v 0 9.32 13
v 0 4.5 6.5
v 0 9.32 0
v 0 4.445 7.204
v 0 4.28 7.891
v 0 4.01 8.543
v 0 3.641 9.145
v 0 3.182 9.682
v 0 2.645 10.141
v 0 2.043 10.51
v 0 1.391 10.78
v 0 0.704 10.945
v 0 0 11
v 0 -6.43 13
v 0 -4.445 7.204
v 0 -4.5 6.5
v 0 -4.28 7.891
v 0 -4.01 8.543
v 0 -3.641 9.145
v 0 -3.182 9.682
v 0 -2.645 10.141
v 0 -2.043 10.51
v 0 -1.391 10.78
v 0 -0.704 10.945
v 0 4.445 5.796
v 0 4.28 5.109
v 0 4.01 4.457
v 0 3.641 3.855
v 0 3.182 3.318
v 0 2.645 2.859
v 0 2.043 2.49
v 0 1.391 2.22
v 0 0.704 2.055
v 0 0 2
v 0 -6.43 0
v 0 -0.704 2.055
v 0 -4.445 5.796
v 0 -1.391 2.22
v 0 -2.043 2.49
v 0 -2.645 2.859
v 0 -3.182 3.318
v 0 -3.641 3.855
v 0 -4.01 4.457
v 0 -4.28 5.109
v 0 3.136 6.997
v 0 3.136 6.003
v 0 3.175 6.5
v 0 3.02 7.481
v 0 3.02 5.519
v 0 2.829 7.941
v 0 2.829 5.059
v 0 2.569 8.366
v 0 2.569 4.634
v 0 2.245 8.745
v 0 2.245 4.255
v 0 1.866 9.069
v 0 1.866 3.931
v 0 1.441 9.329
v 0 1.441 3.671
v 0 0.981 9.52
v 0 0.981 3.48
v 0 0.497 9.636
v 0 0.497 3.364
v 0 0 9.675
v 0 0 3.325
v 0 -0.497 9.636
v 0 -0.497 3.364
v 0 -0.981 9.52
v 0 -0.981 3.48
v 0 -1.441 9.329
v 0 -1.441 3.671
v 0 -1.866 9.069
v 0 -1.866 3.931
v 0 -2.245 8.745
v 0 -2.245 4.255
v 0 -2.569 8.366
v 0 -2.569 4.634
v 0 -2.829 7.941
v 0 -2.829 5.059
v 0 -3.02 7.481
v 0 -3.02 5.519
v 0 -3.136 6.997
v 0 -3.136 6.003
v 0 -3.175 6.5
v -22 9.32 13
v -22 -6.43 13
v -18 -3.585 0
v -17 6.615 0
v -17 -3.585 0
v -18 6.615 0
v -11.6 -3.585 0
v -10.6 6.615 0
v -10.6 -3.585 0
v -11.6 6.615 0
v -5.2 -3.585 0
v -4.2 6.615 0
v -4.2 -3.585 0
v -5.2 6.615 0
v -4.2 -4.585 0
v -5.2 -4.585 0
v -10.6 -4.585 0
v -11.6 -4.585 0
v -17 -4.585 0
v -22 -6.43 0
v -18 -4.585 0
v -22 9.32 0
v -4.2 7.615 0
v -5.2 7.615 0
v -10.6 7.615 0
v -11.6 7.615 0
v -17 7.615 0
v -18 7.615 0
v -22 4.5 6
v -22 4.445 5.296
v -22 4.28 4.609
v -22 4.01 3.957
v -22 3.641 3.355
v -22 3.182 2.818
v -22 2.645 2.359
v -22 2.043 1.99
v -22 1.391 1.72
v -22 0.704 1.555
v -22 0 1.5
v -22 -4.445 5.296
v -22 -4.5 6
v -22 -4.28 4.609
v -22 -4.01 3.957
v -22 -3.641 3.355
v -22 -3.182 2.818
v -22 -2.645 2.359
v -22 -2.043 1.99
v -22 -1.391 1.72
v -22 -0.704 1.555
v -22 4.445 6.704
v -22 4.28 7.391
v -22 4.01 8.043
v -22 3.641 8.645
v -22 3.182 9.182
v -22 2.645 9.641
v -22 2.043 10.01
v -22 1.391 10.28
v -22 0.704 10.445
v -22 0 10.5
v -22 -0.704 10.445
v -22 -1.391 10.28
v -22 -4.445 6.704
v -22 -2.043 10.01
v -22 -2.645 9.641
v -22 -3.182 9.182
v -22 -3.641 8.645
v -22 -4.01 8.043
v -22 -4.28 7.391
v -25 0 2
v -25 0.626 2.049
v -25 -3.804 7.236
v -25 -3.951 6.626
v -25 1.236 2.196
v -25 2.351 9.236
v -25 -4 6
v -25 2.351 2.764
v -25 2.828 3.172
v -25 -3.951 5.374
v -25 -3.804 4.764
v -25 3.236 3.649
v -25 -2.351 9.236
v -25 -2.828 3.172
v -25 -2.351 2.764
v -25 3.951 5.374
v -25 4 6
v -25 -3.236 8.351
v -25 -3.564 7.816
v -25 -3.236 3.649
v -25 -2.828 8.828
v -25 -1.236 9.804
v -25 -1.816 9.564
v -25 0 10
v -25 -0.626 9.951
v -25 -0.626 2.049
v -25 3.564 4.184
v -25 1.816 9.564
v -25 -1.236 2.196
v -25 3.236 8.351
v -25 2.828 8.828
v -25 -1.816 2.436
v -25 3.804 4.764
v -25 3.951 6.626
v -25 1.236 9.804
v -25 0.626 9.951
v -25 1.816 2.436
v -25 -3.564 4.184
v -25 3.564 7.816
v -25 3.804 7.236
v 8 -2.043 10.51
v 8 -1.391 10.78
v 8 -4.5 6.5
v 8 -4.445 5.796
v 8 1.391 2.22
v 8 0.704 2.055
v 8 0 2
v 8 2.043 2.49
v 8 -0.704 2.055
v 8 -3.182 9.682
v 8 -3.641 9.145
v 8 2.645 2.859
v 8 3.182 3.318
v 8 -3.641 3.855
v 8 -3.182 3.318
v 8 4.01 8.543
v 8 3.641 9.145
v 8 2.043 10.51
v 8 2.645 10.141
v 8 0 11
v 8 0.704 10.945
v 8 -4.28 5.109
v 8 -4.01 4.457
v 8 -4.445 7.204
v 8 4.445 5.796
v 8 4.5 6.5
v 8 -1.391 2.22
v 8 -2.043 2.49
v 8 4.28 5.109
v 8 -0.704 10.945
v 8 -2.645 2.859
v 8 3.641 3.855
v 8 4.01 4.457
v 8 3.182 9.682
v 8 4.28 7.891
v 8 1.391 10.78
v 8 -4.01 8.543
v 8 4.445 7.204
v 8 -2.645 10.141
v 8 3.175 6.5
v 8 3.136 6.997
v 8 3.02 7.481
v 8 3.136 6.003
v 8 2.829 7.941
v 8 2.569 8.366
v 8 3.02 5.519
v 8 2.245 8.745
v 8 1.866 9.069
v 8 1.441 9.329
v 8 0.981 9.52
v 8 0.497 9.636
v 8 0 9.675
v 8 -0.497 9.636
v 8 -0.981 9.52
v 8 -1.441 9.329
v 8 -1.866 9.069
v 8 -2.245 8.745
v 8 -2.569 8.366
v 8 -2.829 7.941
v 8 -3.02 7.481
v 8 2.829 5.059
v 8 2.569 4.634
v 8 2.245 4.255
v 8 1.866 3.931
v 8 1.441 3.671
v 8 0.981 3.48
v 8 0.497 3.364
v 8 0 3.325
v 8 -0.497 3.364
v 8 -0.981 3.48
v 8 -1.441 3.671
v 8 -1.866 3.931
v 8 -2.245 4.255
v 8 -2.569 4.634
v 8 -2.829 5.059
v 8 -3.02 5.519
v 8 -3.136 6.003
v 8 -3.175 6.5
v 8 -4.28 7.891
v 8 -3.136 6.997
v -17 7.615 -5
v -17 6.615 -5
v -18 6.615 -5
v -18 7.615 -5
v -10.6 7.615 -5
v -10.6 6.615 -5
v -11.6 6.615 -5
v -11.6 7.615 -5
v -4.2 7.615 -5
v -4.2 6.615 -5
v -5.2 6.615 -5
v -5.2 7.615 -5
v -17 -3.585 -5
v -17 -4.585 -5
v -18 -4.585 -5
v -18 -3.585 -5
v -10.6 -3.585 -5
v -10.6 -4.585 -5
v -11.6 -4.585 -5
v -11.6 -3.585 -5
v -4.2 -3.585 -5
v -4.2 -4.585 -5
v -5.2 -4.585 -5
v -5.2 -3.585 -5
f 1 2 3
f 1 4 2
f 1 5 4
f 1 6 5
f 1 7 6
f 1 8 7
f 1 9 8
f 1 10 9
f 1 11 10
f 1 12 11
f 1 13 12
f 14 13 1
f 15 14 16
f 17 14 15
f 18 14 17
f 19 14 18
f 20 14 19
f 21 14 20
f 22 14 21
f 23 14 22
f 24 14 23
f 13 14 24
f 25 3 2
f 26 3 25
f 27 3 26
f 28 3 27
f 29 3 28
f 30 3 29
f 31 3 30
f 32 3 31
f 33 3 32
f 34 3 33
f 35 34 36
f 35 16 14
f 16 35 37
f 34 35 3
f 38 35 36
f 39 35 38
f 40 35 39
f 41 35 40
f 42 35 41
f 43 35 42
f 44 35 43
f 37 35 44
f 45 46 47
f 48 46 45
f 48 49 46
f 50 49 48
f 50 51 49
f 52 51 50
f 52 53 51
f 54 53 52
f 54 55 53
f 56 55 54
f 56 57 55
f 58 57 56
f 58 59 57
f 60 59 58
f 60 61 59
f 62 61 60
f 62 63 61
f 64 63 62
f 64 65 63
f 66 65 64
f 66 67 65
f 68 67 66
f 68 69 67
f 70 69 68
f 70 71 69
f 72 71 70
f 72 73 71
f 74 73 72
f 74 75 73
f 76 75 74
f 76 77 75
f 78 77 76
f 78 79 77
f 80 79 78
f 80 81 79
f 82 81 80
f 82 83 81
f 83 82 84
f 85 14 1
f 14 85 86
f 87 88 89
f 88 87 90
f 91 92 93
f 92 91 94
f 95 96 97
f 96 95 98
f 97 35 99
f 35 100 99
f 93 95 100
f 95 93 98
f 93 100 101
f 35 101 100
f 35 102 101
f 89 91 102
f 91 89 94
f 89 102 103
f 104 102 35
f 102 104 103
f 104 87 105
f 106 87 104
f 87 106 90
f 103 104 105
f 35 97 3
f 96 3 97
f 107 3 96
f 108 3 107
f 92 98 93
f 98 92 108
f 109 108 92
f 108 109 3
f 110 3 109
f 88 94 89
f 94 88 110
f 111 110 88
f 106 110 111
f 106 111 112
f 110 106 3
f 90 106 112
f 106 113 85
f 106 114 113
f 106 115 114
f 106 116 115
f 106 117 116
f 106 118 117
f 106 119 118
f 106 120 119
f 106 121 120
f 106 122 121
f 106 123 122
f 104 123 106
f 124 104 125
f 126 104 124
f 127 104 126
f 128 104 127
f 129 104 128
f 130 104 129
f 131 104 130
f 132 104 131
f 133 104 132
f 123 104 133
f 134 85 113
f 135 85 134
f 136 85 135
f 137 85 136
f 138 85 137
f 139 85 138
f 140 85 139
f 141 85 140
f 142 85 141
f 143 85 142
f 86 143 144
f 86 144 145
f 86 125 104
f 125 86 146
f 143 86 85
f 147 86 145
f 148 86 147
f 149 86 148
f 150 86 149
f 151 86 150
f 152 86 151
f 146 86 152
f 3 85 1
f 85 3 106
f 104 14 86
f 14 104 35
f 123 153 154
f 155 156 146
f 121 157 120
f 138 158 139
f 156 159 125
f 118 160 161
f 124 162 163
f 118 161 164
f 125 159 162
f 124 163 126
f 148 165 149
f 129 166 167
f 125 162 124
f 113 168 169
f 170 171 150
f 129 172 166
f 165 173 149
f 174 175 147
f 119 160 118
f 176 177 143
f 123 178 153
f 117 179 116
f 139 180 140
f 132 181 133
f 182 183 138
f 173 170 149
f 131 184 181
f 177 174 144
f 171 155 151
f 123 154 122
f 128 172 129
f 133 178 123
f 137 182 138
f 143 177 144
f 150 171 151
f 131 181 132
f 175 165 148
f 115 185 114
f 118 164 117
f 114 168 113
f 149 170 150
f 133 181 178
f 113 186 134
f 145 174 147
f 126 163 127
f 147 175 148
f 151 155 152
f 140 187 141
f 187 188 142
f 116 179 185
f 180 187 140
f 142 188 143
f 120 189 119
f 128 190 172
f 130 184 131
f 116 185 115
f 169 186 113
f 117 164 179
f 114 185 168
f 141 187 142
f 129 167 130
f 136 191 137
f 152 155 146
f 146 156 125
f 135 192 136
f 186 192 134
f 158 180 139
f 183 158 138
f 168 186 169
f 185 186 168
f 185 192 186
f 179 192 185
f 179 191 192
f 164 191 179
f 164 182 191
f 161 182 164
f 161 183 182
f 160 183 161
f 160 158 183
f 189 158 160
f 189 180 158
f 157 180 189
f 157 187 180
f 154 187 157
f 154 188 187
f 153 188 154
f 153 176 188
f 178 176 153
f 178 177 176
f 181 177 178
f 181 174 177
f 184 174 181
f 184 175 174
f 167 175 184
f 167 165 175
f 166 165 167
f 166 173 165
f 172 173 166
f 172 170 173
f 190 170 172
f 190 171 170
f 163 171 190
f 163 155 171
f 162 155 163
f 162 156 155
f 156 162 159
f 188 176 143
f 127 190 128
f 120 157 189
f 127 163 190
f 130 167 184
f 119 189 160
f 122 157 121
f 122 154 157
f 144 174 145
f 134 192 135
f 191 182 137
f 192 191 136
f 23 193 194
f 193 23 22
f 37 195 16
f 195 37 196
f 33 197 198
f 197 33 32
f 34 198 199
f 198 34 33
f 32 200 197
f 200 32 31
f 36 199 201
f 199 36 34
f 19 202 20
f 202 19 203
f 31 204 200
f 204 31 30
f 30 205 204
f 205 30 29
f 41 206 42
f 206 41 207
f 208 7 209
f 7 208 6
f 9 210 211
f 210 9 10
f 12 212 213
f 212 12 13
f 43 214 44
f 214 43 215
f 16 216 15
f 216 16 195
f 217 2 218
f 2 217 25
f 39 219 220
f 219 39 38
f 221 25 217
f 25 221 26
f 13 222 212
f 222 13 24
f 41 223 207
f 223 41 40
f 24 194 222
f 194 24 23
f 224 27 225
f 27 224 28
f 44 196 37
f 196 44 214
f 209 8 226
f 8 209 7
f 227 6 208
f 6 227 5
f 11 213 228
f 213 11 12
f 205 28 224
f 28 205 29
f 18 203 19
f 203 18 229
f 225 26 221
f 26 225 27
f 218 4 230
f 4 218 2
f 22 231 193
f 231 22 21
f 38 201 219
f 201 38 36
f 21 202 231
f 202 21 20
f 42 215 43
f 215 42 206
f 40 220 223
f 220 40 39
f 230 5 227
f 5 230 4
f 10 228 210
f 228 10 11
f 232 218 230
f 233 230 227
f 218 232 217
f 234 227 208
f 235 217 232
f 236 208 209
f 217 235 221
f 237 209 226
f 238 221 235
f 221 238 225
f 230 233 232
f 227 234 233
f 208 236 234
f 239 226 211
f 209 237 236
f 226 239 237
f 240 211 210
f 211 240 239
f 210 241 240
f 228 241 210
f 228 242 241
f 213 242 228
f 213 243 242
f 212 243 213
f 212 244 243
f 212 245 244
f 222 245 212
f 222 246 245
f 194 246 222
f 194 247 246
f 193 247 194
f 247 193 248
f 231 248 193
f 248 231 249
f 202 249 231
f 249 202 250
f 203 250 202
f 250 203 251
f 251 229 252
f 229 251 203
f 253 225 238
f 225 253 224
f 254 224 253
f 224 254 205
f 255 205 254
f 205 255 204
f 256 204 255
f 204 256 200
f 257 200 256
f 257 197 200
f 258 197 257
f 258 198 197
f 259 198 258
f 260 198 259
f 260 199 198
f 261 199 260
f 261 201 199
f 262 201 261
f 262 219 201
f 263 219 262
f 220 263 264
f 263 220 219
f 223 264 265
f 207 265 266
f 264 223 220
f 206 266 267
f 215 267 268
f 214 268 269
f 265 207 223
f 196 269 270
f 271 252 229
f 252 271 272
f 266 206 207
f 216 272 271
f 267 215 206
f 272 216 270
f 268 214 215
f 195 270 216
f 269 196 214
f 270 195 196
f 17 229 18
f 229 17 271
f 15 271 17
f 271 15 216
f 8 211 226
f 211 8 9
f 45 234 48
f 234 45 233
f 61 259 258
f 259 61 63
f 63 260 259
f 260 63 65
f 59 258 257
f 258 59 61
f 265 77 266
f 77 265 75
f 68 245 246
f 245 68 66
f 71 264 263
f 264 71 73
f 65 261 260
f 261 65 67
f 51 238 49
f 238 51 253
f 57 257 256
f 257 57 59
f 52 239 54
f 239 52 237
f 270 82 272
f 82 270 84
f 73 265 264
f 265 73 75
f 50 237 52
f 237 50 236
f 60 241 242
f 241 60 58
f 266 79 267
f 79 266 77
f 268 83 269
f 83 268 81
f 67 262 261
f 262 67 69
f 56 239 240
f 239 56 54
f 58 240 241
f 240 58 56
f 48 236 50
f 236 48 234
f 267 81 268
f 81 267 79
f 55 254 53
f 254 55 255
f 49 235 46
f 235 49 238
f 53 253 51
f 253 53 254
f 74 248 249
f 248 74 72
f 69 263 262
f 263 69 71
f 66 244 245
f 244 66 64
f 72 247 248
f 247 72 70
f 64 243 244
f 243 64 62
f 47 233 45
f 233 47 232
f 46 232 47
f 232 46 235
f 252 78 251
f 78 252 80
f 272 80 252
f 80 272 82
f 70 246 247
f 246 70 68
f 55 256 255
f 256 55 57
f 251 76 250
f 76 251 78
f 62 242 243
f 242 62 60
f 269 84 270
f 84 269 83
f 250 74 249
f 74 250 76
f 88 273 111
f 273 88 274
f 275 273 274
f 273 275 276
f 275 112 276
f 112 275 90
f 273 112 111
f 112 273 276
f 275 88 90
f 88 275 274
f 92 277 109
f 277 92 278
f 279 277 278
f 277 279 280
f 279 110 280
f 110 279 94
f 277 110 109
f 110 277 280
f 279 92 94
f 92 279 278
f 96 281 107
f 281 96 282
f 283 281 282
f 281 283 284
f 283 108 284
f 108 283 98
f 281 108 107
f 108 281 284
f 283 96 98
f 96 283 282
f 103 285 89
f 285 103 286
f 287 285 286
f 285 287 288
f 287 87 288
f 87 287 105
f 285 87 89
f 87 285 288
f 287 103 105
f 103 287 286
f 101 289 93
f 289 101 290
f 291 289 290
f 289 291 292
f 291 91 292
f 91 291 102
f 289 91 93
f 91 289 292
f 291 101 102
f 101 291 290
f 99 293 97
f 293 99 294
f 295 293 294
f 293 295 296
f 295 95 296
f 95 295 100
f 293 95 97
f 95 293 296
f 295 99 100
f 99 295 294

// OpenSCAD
$fn=40;

red = [0.8,0.2,0.2];
black = [0.2,0.2,0.2];
silver = [0.75,0.75,0.75];
epsilon = 0.001;

// The model is centered on the barrel
//
// The pins are the footprint's, with y negated because OpenSCAD is y-up
// and KiCad is y-down.  They were measured with calipers originally and
// were out by 50um on the column pitch and 115um on the row spacing;
// these are the corrected numbers, taken from the part's own data via
// EasyEDA - 6.400 pitch, 11.200 rows.
pins = [ [-17.5,7.115],  [ -11.1,7.115 ], [-4.7,7.115],
	 [-17.5,-4.085], [-11.1,-4.085], [-4.7,-4.085 ] ];

module body()
{
    union() {
	translate([-22,-6.43,0])
	    cube([22,15.75,13]);
	translate([-25,0,6]) {
	    rotate([0,90,0]) {
		cylinder(3,d1=8,d2=9);
	    }
	}
    }
}

module barrel()
{
    translate([0,0,6.5]) rotate([0,90,0]) {
	difference() {
	    cylinder(8,d=9);
	    cylinder(9,d=6.35);
	}
    }
}

module nrj6hm()
{
    color(black) body();
    color(silver)
	barrel();
    // Pins
    color(silver) for (pos = pins)
	translate(pos) translate([0,0,-2]) cube([1,1,6], center=true);
}

nrj6hm();
